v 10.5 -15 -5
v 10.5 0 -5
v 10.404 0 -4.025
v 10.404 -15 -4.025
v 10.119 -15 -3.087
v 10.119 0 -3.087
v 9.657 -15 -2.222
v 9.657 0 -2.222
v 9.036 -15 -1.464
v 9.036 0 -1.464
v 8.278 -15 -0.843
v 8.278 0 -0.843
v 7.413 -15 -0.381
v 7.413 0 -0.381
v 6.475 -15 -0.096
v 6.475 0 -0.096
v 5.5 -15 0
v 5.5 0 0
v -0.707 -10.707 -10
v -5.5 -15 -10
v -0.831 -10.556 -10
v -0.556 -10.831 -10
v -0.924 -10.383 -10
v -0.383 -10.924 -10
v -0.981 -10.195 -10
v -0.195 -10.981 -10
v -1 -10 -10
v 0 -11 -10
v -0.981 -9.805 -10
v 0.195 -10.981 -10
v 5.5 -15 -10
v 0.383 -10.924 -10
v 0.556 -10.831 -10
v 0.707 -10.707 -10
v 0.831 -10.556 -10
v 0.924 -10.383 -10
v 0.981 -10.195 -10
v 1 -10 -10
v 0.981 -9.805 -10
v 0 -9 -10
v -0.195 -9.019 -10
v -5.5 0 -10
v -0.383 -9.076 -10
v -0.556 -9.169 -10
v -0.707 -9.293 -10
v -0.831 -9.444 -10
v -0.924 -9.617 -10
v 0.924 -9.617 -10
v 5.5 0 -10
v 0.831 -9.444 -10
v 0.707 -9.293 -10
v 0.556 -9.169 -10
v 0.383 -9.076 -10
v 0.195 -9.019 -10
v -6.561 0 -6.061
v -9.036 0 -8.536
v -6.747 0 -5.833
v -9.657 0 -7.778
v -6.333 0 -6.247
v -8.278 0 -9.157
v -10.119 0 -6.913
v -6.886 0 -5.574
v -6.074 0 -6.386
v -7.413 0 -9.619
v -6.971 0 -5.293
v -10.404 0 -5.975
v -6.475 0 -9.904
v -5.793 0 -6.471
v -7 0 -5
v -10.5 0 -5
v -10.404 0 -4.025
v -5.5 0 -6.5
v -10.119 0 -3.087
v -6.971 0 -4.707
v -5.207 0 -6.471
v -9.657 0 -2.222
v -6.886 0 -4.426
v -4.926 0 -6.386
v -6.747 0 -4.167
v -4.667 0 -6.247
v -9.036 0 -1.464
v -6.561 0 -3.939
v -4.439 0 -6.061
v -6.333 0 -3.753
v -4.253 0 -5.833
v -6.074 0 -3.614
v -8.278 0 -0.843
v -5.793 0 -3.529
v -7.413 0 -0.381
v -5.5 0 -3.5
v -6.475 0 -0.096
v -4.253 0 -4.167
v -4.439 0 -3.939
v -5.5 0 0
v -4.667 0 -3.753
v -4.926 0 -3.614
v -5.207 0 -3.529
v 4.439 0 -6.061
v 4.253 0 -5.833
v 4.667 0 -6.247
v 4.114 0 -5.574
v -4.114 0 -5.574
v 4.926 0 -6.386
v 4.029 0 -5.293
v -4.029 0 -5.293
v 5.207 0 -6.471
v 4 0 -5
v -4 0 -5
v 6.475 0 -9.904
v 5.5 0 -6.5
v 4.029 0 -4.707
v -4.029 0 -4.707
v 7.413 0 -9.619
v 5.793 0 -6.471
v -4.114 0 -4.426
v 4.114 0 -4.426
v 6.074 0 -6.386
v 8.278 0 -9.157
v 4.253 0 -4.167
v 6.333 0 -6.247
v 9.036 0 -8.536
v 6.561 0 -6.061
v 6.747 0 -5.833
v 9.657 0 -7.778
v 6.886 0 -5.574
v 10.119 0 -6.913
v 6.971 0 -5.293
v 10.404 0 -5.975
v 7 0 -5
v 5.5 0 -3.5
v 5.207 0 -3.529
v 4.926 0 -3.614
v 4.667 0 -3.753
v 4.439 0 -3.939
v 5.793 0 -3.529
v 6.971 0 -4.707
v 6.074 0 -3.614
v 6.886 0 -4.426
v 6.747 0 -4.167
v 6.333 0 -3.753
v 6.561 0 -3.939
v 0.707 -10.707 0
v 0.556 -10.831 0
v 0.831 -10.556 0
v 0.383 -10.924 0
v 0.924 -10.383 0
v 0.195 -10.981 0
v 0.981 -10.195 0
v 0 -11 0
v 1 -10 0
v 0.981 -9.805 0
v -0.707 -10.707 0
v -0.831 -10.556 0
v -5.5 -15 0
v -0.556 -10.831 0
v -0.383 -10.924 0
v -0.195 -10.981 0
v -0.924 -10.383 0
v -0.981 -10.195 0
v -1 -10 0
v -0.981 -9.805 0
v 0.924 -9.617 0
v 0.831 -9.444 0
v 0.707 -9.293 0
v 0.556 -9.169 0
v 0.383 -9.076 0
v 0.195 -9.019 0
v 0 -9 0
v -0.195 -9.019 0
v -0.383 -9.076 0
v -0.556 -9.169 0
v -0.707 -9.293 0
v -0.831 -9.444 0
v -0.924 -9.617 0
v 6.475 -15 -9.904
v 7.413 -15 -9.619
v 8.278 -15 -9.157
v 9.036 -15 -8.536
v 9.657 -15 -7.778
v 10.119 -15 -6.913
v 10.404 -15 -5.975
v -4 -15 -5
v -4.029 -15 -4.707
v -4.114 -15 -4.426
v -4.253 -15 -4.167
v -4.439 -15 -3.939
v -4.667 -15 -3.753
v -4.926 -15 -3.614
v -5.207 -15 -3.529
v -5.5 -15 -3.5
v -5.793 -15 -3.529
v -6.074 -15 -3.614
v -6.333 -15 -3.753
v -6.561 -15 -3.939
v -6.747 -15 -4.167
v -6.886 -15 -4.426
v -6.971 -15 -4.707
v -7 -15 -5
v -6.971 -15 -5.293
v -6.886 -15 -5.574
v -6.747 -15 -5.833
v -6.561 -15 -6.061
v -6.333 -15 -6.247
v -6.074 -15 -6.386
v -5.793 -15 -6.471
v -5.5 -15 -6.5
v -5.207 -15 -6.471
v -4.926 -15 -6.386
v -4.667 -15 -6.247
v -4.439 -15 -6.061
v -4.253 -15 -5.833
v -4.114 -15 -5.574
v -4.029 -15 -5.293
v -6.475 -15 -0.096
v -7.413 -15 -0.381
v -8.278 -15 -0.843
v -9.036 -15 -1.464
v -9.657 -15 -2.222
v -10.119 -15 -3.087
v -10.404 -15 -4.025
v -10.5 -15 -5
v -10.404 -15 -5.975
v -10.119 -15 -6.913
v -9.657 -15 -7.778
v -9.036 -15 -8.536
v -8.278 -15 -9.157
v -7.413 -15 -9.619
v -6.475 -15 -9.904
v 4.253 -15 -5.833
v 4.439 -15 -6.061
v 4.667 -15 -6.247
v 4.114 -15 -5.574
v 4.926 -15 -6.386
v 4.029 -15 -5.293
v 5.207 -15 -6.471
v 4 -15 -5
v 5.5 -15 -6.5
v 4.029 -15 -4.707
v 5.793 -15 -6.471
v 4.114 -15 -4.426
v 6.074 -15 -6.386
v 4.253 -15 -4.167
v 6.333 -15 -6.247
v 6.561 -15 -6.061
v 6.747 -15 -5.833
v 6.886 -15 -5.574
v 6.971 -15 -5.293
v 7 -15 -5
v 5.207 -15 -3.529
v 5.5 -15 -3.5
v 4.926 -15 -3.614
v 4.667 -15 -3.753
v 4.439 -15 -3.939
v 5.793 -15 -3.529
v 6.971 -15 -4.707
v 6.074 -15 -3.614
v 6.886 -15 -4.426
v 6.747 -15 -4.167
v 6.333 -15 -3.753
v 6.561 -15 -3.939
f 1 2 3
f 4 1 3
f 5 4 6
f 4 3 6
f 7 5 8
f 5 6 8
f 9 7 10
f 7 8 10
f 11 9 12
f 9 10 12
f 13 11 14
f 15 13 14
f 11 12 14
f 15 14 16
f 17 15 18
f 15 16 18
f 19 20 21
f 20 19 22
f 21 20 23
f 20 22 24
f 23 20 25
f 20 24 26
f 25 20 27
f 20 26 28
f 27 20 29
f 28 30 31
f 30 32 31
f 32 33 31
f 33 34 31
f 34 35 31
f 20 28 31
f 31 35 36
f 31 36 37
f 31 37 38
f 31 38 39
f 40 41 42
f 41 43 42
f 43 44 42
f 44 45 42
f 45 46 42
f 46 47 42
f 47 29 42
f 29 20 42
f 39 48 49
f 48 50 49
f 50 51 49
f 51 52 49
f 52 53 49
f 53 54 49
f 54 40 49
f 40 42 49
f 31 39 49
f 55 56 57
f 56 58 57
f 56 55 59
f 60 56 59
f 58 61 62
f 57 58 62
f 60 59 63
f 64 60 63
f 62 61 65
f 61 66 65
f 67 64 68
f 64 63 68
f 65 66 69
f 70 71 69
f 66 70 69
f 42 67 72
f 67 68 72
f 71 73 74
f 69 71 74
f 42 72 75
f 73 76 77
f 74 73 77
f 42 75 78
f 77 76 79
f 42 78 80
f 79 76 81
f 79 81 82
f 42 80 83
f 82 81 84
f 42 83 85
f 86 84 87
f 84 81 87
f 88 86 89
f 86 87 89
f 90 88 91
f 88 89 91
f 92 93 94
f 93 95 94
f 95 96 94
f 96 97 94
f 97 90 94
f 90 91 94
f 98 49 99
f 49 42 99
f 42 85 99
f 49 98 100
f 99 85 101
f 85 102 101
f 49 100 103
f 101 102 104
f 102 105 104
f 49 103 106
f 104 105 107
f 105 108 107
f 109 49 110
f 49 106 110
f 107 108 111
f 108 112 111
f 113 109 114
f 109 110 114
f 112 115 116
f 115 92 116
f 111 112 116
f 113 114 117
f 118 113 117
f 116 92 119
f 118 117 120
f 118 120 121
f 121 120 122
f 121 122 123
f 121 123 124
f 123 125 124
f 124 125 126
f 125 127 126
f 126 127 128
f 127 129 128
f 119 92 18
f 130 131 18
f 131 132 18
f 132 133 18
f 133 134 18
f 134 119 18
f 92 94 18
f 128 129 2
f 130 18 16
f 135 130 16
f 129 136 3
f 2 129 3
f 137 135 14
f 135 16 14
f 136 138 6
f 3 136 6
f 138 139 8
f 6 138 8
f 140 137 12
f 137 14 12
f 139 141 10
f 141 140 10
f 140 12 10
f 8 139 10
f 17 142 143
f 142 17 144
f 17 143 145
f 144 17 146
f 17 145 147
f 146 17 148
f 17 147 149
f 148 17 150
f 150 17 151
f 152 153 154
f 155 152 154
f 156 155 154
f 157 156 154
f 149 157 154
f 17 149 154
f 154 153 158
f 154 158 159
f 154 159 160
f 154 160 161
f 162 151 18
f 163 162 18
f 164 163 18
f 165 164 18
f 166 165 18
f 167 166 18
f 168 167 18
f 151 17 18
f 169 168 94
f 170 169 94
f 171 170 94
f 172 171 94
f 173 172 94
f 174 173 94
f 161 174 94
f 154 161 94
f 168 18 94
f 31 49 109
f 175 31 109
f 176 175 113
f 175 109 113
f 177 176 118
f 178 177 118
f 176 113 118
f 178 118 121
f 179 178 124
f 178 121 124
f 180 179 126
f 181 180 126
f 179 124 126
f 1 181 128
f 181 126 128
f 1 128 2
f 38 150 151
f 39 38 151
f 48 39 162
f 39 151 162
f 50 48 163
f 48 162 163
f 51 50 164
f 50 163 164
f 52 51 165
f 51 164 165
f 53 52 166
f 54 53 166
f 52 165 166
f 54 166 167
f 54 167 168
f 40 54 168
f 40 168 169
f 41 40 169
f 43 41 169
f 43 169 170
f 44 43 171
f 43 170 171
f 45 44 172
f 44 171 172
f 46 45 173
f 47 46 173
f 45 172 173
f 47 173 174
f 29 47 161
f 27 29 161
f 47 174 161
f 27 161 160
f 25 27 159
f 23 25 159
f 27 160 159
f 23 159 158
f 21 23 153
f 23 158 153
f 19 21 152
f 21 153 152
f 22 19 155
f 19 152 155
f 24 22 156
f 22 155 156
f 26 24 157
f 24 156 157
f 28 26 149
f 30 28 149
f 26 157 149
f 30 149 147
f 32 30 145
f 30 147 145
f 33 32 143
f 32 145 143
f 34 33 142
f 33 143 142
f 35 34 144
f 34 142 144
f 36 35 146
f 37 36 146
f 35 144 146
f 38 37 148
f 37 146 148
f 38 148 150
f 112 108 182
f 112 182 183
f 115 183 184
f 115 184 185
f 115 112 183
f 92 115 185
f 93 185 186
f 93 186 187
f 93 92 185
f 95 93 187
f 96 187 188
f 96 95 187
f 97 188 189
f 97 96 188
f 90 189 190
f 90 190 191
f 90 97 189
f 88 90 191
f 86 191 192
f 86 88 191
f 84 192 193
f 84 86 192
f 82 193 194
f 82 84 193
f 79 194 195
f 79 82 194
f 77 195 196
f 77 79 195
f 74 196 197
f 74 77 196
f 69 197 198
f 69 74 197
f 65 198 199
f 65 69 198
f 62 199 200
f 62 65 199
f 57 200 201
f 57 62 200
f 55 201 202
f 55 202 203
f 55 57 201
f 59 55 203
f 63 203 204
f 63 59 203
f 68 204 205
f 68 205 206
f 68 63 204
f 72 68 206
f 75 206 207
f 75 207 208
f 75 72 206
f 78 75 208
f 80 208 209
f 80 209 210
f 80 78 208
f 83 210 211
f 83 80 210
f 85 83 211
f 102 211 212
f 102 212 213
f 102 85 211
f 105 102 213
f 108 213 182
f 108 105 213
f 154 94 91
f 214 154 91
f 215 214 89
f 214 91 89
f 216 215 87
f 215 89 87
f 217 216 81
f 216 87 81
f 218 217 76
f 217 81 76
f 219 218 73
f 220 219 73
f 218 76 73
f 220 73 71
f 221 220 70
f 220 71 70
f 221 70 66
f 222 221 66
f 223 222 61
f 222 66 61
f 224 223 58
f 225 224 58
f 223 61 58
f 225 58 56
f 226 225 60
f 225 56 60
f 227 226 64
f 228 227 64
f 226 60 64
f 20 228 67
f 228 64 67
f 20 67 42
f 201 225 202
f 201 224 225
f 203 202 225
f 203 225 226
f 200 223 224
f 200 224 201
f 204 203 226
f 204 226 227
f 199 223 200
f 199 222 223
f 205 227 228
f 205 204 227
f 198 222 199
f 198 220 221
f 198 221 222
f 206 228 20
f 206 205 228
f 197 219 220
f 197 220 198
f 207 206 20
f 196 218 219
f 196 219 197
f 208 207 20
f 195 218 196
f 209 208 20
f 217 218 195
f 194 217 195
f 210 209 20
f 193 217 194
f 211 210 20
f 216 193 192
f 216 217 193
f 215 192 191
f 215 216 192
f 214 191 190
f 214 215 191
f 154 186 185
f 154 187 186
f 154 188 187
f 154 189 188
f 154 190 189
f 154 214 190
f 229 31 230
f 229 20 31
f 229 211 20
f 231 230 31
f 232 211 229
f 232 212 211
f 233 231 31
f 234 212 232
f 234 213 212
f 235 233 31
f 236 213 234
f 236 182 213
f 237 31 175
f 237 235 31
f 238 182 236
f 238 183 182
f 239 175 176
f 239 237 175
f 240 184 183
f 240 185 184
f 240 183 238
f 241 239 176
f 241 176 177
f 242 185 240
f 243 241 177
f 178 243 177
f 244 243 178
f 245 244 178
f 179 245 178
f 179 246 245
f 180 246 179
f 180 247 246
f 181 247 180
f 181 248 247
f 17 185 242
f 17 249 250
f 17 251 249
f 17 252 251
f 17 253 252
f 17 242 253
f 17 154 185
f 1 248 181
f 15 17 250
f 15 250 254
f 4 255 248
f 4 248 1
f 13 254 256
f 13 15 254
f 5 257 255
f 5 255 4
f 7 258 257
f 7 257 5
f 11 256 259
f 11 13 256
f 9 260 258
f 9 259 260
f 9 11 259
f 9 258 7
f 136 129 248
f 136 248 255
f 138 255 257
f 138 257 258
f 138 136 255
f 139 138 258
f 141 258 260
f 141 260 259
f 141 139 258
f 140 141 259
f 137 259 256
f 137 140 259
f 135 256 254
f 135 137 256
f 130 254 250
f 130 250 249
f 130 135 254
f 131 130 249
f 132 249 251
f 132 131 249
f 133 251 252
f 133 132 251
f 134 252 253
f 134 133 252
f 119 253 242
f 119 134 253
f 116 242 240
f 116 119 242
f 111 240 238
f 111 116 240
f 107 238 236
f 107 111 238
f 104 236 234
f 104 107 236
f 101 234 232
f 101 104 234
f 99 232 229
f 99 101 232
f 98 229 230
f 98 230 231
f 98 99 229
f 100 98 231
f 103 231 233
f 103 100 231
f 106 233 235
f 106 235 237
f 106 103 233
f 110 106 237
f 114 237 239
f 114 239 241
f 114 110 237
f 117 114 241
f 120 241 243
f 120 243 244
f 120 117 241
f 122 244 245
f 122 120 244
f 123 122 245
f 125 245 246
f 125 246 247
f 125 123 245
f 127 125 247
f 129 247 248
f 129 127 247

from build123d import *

# Parameters (mm, degrees)
F0_R     = 1.5
F1_DEPTH = 15
F2_R     = 1
F3_DEPTH = 10


with BuildPart() as f1:
    # F0 (on Front) → F1 (new body)
    with BuildSketch(Plane.XZ):
        with BuildLine():
            ThreePointArc((-0.5, -5), (-1.9644660941, -1.4644660941), (-5.5, 0))
            ThreePointArc((-5.5, 0), (-9.0355339059, -1.4644660941), (-10.5, -5))
            ThreePointArc((-10.5, -5), (-9.0355339059, -8.5355339059), (-5.5, -10))
            ThreePointArc((-5.5, -10), (-1.9644660941, -8.5355339059), (-0.5, -5))
        make_face()
        with Locations((-5.5, -5)):
            Circle(F0_R, mode=Mode.SUBTRACT)
        with BuildLine():
            Line((5.5, 0), (-5.5, 0))
            ThreePointArc((-5.5, 0), (-1.9644660941, -1.4644660941), (-0.5, -5))
            ThreePointArc((-0.5, -5), (-1.9644660941, -8.5355339059), (-5.5, -10))
            Line((-5.5, -10), (5.5, -10))
            ThreePointArc((5.5, -10), (0.5, -5), (5.5, 0))
        make_face()
        with BuildLine():
            ThreePointArc((10.5, -5), (9.0355339059, -1.4644660941), (5.5, 0))
            ThreePointArc((5.5, 0), (0.5, -5), (5.5, -10))
            ThreePointArc((5.5, -10), (9.0355339059, -8.5355339059), (10.5, -5))
        make_face()
        with Locations((5.5, -5)):
            Circle(F0_R, mode=Mode.SUBTRACT)
    extrude(amount=F1_DEPTH)

    # F2 (on Top) → F3 (cut)
    with BuildSketch(Plane.XY):
        with Locations((0, -10)):
            Circle(F2_R)
    extrude(amount=-F3_DEPTH, mode=Mode.SUBTRACT)


solid = f1.part
